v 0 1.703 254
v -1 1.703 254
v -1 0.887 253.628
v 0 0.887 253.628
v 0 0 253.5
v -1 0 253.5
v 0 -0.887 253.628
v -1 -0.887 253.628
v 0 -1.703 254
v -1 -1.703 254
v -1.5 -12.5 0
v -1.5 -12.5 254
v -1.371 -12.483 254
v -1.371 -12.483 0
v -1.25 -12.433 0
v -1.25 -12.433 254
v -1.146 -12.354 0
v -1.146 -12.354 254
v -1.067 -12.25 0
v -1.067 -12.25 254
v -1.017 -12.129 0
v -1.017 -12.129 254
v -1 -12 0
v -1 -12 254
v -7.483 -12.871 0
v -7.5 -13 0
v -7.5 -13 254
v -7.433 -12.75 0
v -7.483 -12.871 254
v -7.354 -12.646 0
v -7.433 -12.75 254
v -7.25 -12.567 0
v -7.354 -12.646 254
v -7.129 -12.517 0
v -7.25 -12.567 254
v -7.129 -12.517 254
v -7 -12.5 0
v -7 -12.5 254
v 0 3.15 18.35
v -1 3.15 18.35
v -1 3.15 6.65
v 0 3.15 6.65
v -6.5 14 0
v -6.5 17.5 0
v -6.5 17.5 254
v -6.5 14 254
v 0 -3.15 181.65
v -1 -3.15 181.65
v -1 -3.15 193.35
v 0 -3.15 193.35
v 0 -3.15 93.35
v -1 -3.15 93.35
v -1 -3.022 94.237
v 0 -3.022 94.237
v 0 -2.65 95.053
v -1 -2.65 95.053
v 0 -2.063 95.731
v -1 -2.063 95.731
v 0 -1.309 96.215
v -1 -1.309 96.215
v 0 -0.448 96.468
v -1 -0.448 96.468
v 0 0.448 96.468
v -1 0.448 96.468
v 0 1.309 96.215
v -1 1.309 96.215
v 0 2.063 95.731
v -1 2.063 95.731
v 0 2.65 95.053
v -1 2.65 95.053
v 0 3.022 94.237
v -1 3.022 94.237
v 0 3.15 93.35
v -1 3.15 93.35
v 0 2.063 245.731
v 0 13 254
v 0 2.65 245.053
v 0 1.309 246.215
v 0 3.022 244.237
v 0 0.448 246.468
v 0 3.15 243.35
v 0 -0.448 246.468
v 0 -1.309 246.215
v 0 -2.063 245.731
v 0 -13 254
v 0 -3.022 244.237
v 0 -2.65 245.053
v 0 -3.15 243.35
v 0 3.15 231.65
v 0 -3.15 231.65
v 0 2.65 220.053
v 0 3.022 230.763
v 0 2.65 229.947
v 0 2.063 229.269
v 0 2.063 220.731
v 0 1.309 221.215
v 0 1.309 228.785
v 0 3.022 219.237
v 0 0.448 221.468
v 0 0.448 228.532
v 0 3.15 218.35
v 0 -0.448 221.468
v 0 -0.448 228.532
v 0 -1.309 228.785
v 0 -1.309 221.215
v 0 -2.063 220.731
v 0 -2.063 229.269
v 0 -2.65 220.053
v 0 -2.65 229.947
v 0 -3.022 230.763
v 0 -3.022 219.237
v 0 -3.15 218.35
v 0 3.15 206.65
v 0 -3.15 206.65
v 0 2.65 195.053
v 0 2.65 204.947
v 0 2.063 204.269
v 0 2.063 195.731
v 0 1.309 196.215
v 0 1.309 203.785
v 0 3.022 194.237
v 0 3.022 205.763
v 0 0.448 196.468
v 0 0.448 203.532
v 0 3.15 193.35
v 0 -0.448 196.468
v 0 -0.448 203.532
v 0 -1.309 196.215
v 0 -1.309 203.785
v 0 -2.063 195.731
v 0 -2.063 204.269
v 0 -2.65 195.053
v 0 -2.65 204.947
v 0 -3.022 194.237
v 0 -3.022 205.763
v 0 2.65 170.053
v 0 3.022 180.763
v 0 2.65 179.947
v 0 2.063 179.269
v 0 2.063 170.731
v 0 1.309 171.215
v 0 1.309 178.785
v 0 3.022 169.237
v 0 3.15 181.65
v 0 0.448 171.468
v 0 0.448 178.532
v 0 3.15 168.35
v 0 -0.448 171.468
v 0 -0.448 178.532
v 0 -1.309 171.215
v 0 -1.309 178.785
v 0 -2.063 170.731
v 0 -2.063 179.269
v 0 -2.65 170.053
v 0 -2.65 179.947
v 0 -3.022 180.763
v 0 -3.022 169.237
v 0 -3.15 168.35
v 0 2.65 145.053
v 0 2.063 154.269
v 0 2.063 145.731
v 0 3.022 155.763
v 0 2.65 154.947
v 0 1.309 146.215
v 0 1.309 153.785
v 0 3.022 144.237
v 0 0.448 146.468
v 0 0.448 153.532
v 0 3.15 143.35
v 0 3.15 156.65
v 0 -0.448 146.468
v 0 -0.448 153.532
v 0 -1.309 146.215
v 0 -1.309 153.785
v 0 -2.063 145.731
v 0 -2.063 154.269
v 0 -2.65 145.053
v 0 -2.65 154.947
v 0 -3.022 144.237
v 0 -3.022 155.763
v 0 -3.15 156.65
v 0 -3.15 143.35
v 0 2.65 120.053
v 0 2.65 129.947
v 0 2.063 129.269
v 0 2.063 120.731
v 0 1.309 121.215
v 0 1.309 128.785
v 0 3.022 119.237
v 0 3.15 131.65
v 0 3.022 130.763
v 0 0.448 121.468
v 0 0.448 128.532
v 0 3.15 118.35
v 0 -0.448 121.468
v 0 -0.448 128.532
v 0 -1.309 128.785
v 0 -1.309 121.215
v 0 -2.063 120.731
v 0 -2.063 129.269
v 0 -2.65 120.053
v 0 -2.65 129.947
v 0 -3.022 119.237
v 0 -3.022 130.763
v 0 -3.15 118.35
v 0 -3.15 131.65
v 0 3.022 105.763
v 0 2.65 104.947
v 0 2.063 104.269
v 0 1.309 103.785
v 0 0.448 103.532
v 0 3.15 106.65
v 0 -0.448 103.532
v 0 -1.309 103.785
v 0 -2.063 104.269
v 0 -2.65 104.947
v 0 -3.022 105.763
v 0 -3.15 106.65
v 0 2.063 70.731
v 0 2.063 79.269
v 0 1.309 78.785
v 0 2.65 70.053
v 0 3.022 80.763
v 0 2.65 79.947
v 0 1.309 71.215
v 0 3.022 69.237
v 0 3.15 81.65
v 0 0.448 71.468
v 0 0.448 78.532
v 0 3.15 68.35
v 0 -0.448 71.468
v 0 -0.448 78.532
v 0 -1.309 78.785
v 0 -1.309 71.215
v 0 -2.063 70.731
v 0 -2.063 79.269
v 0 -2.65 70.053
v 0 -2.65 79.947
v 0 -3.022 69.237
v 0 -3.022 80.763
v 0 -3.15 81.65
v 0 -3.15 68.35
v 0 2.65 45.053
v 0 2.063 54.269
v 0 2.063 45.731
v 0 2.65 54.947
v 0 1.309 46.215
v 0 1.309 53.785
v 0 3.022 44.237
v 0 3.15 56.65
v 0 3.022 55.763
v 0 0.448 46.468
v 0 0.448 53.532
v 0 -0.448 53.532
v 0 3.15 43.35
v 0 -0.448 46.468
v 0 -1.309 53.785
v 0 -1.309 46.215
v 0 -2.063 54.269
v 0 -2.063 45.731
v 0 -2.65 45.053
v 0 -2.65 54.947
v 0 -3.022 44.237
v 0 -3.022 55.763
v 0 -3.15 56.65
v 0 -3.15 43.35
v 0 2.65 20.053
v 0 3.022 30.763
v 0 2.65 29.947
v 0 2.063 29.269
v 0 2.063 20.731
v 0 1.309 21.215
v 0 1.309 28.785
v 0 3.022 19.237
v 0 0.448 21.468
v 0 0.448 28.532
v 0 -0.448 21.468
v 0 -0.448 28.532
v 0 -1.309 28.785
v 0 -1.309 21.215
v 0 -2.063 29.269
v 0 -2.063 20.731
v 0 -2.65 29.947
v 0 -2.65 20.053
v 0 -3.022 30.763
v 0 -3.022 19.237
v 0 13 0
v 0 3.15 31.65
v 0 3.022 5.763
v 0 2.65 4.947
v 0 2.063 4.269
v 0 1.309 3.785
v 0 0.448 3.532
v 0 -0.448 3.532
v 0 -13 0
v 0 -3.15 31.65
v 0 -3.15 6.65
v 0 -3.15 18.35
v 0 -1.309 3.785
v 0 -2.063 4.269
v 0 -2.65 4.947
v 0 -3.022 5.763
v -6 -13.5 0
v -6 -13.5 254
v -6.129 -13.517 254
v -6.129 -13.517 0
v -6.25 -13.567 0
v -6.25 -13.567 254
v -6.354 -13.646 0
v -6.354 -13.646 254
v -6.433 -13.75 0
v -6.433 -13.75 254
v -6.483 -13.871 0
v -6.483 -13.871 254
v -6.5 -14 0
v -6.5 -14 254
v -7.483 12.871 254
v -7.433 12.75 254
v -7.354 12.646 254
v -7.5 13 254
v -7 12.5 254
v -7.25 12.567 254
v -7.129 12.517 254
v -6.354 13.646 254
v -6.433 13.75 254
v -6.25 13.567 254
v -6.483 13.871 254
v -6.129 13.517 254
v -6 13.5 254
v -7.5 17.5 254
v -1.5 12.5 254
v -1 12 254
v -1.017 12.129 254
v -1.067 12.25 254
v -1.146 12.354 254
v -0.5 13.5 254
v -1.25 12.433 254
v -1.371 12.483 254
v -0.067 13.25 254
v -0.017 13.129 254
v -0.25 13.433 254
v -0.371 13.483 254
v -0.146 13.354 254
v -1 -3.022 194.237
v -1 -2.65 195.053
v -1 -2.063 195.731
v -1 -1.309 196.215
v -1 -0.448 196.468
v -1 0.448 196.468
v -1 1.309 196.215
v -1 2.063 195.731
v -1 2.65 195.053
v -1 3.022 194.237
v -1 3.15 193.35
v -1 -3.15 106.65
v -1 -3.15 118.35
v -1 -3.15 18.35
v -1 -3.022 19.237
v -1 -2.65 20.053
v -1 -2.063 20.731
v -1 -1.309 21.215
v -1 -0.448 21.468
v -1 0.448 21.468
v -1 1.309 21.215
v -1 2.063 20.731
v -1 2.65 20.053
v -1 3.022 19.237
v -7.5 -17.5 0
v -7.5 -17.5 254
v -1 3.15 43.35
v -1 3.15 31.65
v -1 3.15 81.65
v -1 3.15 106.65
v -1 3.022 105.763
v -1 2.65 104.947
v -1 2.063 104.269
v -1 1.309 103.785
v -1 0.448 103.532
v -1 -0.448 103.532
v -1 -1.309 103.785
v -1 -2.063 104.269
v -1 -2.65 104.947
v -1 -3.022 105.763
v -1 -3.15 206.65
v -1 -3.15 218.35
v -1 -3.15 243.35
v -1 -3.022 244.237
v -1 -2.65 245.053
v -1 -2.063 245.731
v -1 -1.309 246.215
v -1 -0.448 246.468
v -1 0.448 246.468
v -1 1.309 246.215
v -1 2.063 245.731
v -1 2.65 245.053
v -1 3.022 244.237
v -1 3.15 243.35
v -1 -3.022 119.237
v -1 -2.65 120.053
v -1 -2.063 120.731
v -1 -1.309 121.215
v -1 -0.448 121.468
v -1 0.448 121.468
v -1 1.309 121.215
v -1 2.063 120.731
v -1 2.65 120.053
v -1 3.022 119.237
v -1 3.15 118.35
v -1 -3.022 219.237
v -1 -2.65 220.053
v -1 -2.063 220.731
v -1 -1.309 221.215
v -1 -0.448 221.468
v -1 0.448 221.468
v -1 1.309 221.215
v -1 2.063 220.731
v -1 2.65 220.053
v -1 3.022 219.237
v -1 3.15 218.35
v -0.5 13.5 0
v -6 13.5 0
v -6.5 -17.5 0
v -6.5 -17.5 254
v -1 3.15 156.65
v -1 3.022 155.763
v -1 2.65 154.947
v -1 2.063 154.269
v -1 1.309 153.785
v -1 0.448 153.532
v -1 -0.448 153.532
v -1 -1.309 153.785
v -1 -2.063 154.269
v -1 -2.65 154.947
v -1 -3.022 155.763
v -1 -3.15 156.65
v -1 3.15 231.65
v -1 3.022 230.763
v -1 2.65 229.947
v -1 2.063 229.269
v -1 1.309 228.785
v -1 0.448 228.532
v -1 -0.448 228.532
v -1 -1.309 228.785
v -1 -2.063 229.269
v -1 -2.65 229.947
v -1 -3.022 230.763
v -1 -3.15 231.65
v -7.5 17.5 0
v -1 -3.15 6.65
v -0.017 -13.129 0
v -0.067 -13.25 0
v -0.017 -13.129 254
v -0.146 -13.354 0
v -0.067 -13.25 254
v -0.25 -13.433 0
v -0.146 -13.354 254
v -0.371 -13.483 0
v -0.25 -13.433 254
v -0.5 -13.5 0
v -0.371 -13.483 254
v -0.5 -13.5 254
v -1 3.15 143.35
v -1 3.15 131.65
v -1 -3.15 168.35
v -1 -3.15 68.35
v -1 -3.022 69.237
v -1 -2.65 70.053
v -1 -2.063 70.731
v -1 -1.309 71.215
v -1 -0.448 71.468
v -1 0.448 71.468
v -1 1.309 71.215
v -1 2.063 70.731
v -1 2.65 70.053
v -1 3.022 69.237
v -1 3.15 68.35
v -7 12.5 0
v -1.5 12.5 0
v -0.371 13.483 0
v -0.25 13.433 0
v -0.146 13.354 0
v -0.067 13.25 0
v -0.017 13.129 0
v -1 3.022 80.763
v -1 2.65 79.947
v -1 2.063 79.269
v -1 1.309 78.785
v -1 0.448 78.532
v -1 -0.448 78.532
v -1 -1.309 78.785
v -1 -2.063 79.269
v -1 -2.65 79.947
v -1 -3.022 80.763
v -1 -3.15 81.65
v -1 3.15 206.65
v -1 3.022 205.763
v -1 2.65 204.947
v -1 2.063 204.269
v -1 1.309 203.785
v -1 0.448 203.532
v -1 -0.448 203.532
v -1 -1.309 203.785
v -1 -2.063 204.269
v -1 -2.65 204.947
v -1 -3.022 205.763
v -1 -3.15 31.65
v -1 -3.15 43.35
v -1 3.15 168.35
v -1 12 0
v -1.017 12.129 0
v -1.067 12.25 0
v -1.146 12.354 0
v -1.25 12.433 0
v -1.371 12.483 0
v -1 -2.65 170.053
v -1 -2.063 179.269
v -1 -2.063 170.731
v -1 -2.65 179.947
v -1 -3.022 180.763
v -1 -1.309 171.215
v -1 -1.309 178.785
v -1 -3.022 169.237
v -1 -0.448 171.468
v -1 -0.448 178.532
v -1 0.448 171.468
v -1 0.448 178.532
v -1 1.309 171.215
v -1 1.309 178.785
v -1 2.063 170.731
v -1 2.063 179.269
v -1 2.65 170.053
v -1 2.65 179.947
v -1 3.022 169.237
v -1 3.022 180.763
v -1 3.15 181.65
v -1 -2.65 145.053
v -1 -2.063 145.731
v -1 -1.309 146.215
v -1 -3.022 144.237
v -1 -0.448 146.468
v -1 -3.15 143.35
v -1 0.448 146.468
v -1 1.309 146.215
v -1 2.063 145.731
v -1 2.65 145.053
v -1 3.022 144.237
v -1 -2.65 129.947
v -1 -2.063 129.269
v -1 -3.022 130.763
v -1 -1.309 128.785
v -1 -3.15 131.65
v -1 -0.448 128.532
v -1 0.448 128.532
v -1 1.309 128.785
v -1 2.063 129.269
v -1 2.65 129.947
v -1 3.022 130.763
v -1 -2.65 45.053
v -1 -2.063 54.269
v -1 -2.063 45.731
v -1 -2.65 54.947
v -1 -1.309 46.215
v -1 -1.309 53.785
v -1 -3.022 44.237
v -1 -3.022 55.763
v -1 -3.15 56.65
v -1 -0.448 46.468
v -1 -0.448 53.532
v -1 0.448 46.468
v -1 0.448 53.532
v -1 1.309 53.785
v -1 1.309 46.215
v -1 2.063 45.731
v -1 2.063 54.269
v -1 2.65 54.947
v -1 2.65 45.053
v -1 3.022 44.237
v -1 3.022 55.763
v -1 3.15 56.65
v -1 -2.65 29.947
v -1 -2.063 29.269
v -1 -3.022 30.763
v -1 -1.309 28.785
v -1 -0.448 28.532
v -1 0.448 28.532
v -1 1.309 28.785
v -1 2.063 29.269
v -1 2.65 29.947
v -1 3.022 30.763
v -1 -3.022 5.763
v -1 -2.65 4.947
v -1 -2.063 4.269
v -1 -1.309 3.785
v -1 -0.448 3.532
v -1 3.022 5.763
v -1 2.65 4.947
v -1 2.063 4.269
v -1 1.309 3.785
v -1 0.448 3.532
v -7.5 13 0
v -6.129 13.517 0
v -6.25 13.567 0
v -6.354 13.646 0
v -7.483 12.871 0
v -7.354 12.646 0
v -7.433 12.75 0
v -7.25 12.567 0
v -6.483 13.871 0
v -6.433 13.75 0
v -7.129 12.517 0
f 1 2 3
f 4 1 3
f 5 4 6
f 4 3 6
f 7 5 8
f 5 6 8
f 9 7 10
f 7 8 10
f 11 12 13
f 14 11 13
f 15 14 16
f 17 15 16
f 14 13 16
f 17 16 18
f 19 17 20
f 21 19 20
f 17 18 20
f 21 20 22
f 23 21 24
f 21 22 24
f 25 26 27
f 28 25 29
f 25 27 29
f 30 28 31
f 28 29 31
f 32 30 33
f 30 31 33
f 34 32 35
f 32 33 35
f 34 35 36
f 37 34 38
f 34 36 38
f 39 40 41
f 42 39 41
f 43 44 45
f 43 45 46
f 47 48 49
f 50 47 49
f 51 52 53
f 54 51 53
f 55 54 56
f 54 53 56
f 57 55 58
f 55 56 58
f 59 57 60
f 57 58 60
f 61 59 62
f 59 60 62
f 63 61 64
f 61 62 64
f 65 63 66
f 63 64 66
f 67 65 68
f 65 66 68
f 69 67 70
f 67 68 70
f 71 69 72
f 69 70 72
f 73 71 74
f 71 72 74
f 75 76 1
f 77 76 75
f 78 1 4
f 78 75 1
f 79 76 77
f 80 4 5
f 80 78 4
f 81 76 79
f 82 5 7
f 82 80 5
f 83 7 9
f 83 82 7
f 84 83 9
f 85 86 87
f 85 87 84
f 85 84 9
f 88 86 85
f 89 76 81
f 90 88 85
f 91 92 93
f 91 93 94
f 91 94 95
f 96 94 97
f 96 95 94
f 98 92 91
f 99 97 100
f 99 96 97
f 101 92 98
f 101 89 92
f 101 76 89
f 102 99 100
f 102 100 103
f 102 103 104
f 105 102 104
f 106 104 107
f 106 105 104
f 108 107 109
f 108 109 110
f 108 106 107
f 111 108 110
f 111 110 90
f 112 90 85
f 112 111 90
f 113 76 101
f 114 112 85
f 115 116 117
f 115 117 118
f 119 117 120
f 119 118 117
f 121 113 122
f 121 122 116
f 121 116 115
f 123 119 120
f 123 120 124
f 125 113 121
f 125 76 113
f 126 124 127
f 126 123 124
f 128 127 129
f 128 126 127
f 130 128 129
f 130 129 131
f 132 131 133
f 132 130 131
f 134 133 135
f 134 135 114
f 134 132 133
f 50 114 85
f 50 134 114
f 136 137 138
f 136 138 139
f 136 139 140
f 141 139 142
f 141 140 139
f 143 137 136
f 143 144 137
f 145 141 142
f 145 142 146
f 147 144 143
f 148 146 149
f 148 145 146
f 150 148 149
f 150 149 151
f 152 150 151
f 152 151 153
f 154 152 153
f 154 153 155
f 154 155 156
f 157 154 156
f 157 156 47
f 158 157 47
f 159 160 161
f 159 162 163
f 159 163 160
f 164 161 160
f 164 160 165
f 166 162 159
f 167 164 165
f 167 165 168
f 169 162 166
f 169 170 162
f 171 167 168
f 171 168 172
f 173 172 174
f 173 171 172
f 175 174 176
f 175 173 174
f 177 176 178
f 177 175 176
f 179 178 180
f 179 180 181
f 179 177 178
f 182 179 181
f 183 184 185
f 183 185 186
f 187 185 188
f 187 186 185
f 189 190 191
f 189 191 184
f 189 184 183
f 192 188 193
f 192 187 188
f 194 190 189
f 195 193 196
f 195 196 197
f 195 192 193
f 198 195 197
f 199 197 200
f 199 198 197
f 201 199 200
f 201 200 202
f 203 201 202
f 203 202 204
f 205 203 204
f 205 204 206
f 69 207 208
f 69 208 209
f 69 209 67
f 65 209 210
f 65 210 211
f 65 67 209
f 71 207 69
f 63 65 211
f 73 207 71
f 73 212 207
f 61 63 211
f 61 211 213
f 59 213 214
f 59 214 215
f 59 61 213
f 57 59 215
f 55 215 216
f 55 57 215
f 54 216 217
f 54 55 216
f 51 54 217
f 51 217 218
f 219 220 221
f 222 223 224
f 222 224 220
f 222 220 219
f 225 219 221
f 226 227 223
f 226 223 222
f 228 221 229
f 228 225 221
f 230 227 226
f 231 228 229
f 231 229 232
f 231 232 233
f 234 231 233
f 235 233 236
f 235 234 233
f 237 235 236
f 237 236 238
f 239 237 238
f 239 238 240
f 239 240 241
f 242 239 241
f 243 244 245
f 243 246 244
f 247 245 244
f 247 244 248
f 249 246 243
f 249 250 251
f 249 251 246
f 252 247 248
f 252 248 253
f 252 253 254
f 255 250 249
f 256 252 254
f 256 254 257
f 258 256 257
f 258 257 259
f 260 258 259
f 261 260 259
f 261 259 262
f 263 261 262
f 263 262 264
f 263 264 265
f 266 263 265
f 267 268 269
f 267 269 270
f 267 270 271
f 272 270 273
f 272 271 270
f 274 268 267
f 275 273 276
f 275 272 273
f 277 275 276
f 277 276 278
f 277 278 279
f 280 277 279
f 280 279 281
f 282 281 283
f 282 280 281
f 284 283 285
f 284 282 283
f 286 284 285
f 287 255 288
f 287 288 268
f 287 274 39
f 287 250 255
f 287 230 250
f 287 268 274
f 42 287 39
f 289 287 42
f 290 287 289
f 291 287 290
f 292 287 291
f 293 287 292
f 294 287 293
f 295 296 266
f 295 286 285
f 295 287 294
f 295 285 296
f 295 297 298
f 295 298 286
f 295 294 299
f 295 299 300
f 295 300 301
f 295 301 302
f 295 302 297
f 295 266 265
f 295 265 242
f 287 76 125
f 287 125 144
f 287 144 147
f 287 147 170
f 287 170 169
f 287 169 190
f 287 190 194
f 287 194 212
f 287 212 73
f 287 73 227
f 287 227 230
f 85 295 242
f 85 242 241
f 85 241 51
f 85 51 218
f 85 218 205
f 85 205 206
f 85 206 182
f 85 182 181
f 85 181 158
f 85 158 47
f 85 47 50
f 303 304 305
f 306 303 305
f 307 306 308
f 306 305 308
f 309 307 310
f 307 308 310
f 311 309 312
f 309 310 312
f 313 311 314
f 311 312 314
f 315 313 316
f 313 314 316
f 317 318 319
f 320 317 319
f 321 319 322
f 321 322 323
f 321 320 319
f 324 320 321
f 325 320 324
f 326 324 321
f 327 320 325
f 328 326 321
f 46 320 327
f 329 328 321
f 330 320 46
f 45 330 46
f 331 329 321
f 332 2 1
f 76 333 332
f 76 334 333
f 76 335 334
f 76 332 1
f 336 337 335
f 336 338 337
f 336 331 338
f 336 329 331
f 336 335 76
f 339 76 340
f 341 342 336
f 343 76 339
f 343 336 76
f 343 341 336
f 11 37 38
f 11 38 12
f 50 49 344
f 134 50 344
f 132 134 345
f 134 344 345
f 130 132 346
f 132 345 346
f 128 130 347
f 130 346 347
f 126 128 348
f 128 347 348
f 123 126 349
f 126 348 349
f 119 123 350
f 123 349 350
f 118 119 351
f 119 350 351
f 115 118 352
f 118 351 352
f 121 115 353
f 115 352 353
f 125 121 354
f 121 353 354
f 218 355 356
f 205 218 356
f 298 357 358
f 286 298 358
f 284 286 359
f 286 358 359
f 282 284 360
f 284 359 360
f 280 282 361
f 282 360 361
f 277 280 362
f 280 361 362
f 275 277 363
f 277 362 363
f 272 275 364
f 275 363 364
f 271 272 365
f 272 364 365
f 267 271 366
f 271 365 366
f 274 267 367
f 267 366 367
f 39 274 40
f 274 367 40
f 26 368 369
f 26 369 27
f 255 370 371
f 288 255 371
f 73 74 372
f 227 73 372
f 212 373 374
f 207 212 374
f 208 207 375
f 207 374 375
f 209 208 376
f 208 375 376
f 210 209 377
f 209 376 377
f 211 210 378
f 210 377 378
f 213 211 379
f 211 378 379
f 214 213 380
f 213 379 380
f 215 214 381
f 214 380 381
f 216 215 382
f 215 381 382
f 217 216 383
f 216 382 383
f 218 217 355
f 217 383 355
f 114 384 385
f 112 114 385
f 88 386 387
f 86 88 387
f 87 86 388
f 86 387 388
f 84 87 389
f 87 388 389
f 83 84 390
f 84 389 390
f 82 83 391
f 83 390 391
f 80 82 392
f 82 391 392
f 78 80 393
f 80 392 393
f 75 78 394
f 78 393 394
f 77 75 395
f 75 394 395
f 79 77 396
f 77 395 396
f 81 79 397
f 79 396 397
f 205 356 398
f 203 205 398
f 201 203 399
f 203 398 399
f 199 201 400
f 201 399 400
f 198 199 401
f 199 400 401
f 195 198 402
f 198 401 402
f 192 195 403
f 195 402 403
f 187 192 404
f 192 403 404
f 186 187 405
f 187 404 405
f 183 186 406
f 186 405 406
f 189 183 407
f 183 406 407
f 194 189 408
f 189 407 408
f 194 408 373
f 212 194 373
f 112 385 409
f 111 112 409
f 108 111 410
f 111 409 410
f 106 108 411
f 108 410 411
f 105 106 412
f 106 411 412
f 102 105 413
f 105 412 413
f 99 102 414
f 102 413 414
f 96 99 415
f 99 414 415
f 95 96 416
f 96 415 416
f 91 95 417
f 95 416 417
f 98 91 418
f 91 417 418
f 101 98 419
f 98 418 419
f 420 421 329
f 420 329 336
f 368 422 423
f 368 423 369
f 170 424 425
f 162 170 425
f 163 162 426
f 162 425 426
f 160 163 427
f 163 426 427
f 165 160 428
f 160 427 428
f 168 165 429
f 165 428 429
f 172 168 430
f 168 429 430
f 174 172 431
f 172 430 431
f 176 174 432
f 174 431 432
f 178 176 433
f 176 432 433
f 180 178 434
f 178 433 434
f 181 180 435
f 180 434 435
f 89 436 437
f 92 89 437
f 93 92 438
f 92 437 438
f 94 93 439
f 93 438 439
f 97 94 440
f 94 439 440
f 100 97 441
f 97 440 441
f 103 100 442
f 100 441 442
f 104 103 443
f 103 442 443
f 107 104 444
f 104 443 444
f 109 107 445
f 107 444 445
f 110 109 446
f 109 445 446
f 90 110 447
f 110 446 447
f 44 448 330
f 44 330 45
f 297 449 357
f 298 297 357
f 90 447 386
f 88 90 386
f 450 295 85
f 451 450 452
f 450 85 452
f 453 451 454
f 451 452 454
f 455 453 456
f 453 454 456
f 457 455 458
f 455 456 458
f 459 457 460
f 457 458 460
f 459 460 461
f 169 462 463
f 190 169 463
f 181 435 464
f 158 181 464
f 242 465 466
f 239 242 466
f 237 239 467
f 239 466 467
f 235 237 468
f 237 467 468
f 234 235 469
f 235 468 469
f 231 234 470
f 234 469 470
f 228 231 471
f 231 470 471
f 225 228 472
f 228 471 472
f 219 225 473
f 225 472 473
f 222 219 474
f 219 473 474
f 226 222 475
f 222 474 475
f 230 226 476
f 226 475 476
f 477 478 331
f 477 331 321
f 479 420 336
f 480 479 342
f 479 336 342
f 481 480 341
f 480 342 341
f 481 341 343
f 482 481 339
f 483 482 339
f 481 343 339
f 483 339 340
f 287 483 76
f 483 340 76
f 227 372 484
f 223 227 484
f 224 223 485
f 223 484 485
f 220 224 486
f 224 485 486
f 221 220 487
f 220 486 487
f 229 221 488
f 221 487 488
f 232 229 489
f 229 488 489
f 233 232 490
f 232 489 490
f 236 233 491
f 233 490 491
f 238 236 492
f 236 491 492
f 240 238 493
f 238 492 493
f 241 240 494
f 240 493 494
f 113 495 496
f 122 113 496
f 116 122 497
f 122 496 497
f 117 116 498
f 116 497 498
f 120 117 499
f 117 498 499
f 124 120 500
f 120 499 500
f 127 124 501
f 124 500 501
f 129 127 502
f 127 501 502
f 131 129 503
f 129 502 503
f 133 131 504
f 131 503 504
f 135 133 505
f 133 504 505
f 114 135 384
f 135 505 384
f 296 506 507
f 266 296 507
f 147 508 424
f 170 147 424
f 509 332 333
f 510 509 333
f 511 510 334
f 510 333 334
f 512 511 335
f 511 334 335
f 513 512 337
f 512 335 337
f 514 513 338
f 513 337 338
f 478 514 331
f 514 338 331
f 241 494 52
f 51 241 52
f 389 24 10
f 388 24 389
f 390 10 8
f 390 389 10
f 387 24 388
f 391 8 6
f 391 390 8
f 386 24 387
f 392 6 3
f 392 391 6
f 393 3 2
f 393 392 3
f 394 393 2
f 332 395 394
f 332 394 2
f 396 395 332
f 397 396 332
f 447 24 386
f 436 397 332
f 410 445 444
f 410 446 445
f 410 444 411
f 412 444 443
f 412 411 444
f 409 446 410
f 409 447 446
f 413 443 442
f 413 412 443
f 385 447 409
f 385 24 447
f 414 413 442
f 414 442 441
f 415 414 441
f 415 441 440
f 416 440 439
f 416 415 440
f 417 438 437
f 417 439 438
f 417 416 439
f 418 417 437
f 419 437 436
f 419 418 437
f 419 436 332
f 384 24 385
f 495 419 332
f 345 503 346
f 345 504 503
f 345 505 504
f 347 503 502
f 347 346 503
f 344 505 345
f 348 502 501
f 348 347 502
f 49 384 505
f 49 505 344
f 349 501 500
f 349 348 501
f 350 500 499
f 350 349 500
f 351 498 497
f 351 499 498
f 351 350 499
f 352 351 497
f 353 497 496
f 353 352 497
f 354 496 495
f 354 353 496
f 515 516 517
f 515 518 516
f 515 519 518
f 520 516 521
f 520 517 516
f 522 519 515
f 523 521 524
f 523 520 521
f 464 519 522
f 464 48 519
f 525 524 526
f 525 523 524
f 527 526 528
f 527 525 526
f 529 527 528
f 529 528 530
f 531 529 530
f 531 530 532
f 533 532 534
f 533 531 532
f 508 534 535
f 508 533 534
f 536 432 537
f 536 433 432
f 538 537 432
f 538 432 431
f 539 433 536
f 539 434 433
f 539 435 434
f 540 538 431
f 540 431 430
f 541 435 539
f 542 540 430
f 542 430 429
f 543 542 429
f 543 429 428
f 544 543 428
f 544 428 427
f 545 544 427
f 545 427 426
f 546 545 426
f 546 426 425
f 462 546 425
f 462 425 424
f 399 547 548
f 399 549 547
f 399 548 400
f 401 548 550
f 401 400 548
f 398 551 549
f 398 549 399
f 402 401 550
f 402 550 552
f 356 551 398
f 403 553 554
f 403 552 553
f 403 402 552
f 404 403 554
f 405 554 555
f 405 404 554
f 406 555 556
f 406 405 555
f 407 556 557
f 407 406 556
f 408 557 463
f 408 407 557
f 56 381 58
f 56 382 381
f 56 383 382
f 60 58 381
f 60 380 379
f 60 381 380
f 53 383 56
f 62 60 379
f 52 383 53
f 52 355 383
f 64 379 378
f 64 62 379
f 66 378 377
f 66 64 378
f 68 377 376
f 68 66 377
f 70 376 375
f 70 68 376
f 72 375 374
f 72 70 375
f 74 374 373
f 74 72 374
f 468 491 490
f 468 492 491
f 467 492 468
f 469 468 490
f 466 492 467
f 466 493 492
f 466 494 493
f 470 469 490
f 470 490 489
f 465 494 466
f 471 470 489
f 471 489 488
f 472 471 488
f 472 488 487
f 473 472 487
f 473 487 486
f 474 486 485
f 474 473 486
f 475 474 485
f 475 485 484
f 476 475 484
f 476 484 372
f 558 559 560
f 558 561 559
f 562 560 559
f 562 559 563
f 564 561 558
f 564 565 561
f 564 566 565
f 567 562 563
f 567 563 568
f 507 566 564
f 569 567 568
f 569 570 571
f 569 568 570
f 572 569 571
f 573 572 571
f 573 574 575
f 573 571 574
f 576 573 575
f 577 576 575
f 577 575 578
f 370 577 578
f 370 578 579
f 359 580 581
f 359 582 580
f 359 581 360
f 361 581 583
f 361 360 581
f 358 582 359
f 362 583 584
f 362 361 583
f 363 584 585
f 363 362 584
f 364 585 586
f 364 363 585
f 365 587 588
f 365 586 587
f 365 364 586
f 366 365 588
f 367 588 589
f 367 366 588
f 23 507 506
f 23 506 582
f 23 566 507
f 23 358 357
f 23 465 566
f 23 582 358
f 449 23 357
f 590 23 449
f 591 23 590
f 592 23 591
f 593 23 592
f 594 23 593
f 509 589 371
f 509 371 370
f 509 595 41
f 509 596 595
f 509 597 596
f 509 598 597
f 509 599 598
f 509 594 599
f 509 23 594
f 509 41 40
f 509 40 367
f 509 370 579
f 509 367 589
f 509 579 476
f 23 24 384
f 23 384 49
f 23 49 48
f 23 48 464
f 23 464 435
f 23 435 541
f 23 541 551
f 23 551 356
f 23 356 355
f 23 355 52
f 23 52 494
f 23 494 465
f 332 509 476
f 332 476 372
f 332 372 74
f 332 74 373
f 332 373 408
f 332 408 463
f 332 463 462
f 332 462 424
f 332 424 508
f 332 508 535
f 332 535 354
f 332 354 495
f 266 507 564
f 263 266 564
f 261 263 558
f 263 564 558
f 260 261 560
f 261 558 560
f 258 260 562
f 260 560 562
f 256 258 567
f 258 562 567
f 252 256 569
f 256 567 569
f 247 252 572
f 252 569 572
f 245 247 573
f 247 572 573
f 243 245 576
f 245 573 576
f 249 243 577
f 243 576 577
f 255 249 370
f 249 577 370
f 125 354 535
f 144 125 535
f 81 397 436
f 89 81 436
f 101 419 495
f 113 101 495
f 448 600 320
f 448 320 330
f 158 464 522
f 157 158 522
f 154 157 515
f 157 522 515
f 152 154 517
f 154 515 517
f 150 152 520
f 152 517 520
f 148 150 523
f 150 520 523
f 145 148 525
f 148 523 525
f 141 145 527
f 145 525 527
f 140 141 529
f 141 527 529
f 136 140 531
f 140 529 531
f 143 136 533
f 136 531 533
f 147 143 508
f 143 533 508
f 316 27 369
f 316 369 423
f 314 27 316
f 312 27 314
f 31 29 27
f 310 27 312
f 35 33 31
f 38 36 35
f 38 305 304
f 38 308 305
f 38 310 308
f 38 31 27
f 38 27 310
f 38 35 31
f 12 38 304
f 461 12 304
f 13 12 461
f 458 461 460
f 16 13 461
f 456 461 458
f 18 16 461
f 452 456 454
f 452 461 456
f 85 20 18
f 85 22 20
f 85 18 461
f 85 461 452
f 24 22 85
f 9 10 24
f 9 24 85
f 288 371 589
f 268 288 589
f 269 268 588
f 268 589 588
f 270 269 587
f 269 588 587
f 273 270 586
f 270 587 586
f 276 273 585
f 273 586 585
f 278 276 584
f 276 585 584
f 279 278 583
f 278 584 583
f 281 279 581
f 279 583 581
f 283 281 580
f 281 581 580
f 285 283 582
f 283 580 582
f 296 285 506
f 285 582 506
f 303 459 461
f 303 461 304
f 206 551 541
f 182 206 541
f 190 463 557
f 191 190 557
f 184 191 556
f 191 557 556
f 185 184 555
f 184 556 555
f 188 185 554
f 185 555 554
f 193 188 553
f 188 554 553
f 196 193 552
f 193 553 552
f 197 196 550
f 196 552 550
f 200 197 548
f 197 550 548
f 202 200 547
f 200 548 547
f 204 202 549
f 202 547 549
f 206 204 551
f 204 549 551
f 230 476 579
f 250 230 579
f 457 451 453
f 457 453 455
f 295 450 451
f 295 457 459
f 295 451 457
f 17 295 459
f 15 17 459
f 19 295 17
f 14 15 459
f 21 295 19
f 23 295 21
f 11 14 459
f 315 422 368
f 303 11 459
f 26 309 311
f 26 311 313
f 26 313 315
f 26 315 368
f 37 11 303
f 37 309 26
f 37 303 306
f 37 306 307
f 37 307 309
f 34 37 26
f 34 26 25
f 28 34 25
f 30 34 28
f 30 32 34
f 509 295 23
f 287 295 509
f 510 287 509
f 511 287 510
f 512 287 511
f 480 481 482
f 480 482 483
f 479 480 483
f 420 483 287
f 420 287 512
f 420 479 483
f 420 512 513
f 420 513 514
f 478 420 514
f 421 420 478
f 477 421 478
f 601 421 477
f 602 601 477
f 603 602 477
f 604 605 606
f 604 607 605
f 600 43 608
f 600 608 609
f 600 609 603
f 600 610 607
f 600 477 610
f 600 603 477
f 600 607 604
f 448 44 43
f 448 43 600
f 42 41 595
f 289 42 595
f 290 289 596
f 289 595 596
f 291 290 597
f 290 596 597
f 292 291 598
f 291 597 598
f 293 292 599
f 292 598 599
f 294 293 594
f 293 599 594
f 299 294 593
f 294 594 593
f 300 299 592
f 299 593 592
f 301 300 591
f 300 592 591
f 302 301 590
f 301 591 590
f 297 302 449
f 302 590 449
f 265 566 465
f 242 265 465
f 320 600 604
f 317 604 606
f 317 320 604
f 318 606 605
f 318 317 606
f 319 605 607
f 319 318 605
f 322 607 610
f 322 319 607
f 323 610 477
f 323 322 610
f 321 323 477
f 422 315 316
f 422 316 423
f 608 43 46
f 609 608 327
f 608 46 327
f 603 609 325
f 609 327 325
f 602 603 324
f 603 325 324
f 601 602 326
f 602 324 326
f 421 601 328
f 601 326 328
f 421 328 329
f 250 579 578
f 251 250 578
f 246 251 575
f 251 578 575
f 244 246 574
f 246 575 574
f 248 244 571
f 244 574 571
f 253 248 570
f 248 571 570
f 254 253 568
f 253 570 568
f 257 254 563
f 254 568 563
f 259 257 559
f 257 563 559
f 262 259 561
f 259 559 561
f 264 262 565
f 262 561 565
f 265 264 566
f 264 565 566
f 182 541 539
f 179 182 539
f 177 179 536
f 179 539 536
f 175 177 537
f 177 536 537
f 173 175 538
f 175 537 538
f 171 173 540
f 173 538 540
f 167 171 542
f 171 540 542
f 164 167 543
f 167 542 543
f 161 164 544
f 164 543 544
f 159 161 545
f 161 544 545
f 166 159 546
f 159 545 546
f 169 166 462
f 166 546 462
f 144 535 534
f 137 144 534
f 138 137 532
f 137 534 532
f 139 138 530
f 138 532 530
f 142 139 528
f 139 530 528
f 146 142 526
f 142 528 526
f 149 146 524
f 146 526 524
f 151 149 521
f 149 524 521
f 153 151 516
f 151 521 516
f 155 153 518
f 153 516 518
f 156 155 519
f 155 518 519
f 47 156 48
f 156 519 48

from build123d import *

# Parameters (mm, degrees)
EXTRUDE_THIN1_DEPTH = 449.2625
CUT_EXTRUDE1_START  = -8.5
CUT_EXTRUDE1_DEPTH  = 9.5
LPATTERN1_COUNT     = 18
LPATTERN1_PITCH     = 25
FILLET1_R           = 0.5
SKETCH5_W           = 13.158199176
SKETCH5_H           = 40.042206119
CUT_EXTRUDE2_DEPTH  = 195.2625


with BuildPart() as part:
    # Sketch3 → Extrude-Thin1 (new body)
    with BuildSketch(Plane.XY):
        Polygon((-6.5, 17.5), (-6.5, 13.5), (0, 13.5), (0, -13.5), (-6.5, -13.5), (-6.5, -17.5), (-7.5, -17.5), (-7.5, -12.5), (-1, -12.5), (-1, 12.5), (-7.5, 12.5), (-7.5, 17.5), align=None)
    extrude(amount=EXTRUDE_THIN1_DEPTH)

    # Sketch4 → Cut-Extrude1 (cut)
    with BuildSketch(Plane(origin=(0, 0, 0), x_dir=(0, 0, -1), z_dir=(1, 0, 0)).offset(CUT_EXTRUDE1_START)):
        with BuildLine():
            Line((-6.65, -3.15), (-18.35, -3.15))
            ThreePointArc((-18.35, -3.15), (-21.5, 0), (-18.35, 3.15))
            Line((-18.35, 3.15), (-6.65, 3.15))
            ThreePointArc((-6.65, 3.15), (-3.5, 0), (-6.65, -3.15))
        make_face()
    cut_extrude1 = extrude(amount=CUT_EXTRUDE1_DEPTH, mode=Mode.SUBTRACT)

    # LPattern1: Cut-Extrude1 ×18
    with Locations(*[(0, 0, i * LPATTERN1_PITCH) for i in range(1, LPATTERN1_COUNT)]):
        add(cut_extrude1, mode=Mode.SUBTRACT)

    # Fillet1
    fillet1_edges = [part.edges().sort_by_distance(p)[0] for p in [
        (-6.5, 13.5, 224.63125),
        (0, 13.5, 224.63125),
        (0, -13.5, 224.63125),
        (-6.5, -13.5, 224.63125),
        (-7.5, -12.5, 224.63125),
        (-1, -12.5, 224.63125),
        (-1, 12.5, 224.63125),
        (-7.5, 12.5, 224.63125),
    ]]
    fillet(fillet1_edges, radius=FILLET1_R)

    # Sketch5 → Cut-Extrude2 (cut)
    with BuildSketch(Plane.XY.offset(449.2625)):
        with Locations((-4.513311055, 1.584769395)):
            Rectangle(SKETCH5_W, SKETCH5_H)
    extrude(amount=-CUT_EXTRUDE2_DEPTH, mode=Mode.SUBTRACT)


solid = part.part
